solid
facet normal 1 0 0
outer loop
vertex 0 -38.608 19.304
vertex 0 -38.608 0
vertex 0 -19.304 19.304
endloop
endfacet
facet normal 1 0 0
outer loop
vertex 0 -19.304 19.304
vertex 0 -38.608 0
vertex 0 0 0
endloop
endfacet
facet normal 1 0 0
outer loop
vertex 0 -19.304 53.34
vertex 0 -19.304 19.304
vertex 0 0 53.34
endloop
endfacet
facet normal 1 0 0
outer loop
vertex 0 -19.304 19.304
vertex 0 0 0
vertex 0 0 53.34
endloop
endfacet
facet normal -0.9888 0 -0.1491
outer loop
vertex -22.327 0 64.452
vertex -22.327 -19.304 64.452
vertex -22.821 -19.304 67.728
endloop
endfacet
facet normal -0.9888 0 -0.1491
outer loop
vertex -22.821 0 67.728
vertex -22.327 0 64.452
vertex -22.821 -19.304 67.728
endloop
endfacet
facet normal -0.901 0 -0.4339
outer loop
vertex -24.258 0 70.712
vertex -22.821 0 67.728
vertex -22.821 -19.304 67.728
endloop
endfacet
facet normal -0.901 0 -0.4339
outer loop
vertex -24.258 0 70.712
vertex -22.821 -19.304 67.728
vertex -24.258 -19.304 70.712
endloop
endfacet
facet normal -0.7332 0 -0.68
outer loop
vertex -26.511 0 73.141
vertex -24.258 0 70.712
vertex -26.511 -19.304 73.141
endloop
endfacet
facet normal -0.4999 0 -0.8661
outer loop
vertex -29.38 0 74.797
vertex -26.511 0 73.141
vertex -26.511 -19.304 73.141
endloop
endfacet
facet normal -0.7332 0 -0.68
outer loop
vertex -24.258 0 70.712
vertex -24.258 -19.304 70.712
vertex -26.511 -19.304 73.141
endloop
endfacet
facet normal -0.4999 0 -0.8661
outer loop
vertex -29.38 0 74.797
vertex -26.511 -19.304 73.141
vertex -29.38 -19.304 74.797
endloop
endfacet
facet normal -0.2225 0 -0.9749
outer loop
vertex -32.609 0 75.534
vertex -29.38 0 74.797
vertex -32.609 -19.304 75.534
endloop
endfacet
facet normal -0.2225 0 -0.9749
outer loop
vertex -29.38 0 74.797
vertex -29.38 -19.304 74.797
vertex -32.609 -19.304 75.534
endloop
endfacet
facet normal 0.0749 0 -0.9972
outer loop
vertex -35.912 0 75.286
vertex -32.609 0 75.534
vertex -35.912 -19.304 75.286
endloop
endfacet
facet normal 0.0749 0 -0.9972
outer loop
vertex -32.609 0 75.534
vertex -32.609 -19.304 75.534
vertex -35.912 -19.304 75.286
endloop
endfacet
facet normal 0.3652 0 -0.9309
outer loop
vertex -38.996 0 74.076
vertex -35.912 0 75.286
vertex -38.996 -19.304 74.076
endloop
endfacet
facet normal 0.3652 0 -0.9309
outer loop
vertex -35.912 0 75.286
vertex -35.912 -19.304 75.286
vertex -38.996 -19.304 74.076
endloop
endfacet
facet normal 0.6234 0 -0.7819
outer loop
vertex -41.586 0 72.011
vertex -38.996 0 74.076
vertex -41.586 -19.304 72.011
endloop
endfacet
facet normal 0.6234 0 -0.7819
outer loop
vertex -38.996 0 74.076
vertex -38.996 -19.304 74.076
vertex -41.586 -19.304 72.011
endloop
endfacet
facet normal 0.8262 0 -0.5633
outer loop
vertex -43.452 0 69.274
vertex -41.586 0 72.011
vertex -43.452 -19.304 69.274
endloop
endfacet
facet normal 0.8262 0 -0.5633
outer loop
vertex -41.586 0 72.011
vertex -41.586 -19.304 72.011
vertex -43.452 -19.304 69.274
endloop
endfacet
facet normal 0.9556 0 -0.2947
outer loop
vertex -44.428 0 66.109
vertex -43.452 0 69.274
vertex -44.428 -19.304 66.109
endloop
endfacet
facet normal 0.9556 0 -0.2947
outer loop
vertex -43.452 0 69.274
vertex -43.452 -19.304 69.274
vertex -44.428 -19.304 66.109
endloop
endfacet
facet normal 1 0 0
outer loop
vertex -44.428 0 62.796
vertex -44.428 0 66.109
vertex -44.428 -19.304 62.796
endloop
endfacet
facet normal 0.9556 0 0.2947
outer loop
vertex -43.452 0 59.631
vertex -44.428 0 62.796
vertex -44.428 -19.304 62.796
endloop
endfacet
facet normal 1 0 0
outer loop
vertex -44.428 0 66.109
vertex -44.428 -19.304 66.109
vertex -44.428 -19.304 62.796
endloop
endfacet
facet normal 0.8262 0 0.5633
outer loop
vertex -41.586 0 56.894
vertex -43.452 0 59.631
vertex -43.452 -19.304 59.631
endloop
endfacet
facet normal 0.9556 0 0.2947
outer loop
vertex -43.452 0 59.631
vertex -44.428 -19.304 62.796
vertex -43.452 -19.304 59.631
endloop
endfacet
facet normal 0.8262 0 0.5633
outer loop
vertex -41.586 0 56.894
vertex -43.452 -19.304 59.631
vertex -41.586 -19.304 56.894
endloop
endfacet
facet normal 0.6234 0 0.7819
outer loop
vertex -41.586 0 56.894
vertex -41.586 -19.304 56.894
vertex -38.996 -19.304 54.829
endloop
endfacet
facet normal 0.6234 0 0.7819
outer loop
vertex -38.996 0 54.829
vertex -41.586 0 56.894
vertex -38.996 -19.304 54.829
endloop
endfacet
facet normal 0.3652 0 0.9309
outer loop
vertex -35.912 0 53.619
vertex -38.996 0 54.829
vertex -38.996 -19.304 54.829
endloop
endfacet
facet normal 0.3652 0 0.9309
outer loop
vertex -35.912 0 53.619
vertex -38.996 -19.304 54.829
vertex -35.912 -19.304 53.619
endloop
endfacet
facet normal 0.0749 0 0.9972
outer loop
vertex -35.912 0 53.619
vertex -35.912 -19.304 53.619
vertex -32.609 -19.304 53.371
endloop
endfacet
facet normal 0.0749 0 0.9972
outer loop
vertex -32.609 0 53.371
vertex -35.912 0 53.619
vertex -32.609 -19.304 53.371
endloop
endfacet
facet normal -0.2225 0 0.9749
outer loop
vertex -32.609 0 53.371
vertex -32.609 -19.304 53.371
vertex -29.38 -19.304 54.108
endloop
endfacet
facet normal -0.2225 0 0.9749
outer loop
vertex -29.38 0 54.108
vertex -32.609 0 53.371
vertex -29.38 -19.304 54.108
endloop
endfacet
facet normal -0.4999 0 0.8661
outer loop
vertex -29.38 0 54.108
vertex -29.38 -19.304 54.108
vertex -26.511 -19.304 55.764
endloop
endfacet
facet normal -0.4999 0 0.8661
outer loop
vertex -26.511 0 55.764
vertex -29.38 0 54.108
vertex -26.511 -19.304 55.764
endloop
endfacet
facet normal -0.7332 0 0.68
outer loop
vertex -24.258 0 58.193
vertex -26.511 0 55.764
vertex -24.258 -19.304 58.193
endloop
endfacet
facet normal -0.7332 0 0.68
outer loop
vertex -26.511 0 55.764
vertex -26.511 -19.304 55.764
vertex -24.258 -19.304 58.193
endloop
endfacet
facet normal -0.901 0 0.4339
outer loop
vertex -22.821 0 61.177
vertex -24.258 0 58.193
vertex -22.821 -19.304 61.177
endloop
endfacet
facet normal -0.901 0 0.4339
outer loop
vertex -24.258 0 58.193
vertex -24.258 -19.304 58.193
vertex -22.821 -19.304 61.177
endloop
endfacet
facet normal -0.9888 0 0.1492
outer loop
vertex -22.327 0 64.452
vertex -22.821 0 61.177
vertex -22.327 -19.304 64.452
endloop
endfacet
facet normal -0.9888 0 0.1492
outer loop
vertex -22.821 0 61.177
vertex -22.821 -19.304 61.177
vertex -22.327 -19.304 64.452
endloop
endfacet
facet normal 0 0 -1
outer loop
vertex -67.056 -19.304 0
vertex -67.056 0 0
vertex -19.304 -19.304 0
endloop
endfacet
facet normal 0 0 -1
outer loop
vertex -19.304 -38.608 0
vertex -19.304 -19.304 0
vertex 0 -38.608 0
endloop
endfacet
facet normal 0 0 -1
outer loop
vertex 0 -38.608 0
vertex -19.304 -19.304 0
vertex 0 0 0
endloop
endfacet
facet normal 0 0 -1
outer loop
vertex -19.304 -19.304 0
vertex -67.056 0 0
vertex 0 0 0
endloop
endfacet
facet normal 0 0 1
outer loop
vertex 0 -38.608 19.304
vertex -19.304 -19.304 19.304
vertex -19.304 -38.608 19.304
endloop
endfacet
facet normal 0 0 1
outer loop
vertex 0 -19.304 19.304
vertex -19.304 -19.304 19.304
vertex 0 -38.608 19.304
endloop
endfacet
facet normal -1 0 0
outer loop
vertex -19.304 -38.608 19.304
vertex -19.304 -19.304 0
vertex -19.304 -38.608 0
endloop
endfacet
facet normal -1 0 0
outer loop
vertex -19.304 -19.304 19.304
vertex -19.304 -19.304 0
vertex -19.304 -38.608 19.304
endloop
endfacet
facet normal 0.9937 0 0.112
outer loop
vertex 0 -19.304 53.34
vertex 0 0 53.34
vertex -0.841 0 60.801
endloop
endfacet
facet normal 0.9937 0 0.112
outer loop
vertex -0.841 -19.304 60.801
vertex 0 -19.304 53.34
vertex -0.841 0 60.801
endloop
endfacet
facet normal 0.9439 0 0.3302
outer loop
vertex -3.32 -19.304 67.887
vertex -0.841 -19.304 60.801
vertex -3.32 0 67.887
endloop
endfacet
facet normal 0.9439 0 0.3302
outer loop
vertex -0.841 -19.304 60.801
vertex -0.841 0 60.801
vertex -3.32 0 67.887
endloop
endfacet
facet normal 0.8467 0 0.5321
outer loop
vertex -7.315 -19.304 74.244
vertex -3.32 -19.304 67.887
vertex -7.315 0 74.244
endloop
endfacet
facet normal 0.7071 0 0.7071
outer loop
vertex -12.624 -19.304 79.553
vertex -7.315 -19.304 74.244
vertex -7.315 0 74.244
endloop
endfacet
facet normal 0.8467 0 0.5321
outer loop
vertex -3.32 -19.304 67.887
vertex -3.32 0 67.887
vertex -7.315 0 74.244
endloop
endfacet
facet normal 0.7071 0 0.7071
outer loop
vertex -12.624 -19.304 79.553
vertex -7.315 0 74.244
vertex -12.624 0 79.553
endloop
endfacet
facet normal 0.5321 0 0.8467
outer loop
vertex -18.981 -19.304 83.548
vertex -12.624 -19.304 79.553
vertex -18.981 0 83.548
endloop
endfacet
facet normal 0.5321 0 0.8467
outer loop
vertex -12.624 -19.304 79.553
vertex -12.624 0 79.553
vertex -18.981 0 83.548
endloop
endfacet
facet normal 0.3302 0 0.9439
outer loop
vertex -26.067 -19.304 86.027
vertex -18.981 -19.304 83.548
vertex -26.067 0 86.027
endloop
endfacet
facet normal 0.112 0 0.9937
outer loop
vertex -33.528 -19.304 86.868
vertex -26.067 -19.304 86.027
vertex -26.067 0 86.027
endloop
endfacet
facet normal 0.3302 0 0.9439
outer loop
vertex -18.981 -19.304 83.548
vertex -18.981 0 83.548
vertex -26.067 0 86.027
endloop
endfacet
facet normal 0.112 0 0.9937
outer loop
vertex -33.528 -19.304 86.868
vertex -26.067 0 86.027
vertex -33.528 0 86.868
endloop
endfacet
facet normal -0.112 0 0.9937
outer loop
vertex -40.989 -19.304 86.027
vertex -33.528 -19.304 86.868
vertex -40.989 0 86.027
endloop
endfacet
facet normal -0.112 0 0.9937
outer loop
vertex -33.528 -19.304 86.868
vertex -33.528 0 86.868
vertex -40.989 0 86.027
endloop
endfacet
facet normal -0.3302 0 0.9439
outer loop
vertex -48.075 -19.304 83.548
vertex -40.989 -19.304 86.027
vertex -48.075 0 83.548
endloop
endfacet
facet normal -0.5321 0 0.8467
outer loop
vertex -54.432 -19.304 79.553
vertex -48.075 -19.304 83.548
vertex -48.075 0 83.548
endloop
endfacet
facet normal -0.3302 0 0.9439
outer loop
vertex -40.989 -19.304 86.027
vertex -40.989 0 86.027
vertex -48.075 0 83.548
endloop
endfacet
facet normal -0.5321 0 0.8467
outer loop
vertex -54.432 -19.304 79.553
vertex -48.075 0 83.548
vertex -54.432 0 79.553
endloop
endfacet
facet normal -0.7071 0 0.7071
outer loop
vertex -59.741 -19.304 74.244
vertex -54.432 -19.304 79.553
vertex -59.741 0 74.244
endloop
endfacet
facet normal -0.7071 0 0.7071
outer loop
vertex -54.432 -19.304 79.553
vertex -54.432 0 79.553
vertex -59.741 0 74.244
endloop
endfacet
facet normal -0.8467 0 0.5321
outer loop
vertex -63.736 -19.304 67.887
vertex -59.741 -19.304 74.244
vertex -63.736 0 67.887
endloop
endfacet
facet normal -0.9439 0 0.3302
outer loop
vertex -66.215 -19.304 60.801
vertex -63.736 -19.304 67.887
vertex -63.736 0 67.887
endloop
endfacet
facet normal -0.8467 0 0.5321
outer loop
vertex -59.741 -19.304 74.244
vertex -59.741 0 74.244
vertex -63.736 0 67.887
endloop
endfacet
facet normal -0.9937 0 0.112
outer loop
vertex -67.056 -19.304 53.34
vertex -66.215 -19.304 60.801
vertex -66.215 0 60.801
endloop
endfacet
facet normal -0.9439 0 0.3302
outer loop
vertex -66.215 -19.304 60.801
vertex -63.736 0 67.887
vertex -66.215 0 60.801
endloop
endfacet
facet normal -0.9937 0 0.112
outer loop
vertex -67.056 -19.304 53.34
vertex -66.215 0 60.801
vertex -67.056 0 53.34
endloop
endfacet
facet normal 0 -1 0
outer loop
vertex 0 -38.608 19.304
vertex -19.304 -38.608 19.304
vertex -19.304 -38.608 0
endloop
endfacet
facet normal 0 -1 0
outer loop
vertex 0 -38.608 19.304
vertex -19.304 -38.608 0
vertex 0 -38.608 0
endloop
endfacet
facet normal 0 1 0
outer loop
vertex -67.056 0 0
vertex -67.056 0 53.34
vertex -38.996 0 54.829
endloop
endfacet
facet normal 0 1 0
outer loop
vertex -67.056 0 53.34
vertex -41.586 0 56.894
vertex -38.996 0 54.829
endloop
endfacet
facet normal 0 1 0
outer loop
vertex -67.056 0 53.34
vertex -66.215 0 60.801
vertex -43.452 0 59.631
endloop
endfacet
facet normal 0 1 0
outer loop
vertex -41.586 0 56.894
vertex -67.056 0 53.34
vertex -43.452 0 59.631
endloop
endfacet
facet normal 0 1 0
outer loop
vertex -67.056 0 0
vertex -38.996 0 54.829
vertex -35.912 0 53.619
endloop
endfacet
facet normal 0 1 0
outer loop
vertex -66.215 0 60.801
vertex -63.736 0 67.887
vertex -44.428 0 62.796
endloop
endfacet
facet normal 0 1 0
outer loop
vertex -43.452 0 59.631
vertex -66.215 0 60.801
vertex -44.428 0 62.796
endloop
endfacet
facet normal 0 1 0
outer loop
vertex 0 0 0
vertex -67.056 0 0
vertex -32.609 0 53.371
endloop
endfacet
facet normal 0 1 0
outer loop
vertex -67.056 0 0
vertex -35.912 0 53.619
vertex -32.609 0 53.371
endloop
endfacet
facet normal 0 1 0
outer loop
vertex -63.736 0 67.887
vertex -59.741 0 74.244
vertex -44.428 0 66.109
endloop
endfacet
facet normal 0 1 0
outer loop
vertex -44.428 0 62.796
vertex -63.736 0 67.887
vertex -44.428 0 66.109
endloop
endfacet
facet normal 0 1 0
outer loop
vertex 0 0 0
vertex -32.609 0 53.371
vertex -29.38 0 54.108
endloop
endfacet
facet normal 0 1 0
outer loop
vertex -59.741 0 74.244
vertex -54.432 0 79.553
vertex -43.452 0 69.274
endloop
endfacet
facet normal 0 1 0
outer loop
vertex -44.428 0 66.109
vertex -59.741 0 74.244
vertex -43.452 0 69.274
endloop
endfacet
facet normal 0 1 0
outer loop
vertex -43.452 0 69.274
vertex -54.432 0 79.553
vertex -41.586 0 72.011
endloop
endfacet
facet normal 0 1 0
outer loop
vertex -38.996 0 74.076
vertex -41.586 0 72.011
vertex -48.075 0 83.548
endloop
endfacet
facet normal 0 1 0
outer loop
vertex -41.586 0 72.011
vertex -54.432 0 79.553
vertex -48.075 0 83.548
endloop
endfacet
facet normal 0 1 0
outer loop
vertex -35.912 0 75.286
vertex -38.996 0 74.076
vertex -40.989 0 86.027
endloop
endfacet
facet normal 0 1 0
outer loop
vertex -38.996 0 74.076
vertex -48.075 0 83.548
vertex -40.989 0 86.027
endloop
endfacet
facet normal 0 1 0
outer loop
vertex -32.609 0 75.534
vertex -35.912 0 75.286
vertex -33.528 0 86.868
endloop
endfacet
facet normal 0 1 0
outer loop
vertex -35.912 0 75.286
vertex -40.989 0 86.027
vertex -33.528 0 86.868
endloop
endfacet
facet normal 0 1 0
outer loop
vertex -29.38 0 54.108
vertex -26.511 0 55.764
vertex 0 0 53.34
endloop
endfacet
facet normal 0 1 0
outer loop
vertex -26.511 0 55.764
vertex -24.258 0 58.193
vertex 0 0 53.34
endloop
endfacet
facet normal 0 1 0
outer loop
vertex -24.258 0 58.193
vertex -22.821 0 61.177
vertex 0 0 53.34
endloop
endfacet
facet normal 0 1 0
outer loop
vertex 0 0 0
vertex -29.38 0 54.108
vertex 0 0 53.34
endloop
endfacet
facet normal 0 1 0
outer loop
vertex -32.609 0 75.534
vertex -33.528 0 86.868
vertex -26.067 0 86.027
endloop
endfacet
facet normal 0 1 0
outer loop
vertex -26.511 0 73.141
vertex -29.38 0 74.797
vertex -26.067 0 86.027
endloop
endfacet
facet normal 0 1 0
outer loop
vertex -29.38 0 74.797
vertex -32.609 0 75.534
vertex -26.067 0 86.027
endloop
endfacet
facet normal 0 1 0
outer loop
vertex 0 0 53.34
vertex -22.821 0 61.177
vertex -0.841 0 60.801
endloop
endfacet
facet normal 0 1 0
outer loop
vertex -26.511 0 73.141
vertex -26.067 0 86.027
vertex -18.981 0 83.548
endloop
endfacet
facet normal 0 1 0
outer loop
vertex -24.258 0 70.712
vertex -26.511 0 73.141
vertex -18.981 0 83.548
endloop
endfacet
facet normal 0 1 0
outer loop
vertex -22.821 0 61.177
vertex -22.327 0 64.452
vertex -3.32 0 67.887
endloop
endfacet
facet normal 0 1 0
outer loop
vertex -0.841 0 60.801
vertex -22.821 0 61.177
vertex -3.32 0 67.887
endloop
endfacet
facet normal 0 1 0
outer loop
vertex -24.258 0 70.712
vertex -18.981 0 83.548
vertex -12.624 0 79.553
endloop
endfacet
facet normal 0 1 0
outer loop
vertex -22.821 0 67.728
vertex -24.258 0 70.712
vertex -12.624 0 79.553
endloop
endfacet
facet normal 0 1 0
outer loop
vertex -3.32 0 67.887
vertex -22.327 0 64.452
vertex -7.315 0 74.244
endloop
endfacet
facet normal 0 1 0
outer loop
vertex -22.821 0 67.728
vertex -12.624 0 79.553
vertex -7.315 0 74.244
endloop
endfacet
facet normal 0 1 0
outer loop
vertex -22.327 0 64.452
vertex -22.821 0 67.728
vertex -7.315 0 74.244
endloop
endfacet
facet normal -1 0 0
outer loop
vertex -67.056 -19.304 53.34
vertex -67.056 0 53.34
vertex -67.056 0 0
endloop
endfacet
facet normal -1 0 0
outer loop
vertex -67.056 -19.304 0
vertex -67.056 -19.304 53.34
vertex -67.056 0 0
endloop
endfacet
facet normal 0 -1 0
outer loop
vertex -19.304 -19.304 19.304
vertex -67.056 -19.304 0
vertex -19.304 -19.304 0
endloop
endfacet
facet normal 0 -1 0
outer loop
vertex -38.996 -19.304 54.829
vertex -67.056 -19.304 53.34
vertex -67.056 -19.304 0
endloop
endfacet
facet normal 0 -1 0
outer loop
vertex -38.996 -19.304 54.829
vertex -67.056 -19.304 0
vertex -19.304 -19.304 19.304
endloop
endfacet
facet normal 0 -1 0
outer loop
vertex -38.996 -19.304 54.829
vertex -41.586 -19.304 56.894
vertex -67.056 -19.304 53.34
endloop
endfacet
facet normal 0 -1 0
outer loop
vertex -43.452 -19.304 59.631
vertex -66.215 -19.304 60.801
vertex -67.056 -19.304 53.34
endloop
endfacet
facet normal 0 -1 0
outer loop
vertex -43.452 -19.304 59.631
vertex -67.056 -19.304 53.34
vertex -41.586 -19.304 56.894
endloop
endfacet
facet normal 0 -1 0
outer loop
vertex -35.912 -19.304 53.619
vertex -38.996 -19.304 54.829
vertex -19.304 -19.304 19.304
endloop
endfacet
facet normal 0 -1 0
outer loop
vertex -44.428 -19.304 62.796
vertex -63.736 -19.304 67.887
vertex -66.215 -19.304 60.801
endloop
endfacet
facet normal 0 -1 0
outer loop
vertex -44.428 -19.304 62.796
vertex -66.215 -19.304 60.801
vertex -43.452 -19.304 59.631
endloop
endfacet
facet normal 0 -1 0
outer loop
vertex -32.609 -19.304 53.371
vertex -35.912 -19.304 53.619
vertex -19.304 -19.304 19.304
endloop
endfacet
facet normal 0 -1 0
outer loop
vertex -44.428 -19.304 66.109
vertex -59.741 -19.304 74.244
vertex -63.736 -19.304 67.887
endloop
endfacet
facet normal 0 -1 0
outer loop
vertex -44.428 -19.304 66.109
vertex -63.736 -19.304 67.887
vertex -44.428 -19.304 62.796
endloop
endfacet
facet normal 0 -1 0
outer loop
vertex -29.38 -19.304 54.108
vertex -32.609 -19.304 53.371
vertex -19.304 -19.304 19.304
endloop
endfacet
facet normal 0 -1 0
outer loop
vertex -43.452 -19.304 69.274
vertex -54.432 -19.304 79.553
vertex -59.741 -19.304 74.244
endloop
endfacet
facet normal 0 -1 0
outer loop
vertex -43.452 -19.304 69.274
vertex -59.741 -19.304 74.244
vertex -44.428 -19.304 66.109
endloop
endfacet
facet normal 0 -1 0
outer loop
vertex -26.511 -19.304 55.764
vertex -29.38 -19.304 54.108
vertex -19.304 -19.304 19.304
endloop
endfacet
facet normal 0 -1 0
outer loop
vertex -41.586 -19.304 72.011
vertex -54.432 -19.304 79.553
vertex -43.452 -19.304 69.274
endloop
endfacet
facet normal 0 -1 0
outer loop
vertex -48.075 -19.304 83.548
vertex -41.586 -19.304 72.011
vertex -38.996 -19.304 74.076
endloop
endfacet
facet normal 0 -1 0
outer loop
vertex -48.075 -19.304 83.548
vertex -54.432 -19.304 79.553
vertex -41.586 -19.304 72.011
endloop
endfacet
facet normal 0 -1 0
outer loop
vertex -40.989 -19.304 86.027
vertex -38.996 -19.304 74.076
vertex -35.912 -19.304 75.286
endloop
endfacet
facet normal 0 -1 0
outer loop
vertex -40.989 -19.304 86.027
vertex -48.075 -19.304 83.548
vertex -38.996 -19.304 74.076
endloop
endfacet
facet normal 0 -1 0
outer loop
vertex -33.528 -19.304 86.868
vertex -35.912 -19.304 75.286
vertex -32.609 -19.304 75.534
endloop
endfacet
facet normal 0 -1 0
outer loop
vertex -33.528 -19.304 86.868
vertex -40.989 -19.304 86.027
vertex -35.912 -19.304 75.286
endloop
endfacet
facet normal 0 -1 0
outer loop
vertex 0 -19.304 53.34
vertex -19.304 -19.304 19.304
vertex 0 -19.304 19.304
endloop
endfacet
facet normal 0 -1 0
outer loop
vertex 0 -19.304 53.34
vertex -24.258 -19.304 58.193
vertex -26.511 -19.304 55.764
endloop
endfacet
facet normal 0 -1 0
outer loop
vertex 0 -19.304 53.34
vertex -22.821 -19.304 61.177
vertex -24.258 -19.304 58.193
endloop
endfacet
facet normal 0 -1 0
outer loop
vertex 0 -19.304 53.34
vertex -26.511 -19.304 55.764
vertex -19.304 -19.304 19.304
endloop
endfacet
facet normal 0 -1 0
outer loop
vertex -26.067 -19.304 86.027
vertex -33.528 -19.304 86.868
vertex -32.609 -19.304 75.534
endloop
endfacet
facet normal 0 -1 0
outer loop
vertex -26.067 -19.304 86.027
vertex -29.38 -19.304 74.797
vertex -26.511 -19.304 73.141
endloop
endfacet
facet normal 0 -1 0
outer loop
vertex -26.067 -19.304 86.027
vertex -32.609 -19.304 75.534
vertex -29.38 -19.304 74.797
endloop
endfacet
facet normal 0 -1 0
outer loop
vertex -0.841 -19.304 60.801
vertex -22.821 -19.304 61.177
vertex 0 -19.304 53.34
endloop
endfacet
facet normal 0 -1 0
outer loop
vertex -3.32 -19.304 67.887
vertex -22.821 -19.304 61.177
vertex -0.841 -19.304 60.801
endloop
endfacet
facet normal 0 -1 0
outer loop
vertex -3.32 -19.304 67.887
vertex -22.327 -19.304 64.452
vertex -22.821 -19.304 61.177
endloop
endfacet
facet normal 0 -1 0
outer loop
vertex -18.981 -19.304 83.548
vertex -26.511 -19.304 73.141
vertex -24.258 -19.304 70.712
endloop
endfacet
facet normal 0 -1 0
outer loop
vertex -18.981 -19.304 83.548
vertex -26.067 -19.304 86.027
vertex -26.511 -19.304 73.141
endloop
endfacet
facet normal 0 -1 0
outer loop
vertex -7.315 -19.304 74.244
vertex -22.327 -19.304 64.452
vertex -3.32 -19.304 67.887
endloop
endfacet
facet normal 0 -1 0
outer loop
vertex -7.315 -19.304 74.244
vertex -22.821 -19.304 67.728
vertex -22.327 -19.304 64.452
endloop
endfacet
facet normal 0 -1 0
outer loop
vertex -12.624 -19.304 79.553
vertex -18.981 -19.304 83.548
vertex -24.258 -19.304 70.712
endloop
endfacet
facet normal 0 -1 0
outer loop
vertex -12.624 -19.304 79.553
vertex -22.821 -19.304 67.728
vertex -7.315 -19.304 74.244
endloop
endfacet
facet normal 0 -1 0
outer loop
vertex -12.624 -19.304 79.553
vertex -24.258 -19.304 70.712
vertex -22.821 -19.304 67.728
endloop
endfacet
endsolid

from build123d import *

# Parameters (mm, degrees)
F1_DEPTH = 19.304
F3_DEPTH = 19.304
F4_R     = 11.1125
F5_DEPTH = 19.304
F6_W     = 19.304
F6_H     = 19.304
F7_DEPTH = 19.304


with BuildPart() as f1:
    # F0 (on Front) → F1 (new body)
    with BuildSketch(Plane.XZ):
        with BuildLine():
            Line((-67.056, 0), (0, 0))
            Line((0, 0), (0, 53.34))
            ThreePointArc((0, 53.34), (-33.528, 86.868), (-67.056, 53.34))
            Line((-67.056, 53.34), (-67.056, 0))
        make_face()
    extrude(amount=F1_DEPTH)

    # F0 (on Front) → F3 (join)
    with BuildSketch(Plane.XZ):
        with BuildLine():
            Line((-67.056, 0), (0, 0))
            Line((0, 0), (0, 53.34))
            ThreePointArc((0, 53.34), (-33.528, 86.868), (-67.056, 53.34))
            Line((-67.056, 53.34), (-67.056, 0))
        make_face()
    extrude(amount=F3_DEPTH)

    # F4 (on face) → F5 (cut)
    with BuildSketch(Plane.XZ.offset(19.304)):
        with Locations((-33.439703, 64.4525)):
            Circle(F4_R)
    extrude(amount=-F5_DEPTH, mode=Mode.SUBTRACT)

    # F6 (on face) → F7 (join)
    with BuildSketch(Plane.XZ.offset(19.304)):
        with Locations((-9.652, 9.652)):
            Rectangle(F6_W, F6_H)
    extrude(amount=F7_DEPTH)


solid = f1.part
